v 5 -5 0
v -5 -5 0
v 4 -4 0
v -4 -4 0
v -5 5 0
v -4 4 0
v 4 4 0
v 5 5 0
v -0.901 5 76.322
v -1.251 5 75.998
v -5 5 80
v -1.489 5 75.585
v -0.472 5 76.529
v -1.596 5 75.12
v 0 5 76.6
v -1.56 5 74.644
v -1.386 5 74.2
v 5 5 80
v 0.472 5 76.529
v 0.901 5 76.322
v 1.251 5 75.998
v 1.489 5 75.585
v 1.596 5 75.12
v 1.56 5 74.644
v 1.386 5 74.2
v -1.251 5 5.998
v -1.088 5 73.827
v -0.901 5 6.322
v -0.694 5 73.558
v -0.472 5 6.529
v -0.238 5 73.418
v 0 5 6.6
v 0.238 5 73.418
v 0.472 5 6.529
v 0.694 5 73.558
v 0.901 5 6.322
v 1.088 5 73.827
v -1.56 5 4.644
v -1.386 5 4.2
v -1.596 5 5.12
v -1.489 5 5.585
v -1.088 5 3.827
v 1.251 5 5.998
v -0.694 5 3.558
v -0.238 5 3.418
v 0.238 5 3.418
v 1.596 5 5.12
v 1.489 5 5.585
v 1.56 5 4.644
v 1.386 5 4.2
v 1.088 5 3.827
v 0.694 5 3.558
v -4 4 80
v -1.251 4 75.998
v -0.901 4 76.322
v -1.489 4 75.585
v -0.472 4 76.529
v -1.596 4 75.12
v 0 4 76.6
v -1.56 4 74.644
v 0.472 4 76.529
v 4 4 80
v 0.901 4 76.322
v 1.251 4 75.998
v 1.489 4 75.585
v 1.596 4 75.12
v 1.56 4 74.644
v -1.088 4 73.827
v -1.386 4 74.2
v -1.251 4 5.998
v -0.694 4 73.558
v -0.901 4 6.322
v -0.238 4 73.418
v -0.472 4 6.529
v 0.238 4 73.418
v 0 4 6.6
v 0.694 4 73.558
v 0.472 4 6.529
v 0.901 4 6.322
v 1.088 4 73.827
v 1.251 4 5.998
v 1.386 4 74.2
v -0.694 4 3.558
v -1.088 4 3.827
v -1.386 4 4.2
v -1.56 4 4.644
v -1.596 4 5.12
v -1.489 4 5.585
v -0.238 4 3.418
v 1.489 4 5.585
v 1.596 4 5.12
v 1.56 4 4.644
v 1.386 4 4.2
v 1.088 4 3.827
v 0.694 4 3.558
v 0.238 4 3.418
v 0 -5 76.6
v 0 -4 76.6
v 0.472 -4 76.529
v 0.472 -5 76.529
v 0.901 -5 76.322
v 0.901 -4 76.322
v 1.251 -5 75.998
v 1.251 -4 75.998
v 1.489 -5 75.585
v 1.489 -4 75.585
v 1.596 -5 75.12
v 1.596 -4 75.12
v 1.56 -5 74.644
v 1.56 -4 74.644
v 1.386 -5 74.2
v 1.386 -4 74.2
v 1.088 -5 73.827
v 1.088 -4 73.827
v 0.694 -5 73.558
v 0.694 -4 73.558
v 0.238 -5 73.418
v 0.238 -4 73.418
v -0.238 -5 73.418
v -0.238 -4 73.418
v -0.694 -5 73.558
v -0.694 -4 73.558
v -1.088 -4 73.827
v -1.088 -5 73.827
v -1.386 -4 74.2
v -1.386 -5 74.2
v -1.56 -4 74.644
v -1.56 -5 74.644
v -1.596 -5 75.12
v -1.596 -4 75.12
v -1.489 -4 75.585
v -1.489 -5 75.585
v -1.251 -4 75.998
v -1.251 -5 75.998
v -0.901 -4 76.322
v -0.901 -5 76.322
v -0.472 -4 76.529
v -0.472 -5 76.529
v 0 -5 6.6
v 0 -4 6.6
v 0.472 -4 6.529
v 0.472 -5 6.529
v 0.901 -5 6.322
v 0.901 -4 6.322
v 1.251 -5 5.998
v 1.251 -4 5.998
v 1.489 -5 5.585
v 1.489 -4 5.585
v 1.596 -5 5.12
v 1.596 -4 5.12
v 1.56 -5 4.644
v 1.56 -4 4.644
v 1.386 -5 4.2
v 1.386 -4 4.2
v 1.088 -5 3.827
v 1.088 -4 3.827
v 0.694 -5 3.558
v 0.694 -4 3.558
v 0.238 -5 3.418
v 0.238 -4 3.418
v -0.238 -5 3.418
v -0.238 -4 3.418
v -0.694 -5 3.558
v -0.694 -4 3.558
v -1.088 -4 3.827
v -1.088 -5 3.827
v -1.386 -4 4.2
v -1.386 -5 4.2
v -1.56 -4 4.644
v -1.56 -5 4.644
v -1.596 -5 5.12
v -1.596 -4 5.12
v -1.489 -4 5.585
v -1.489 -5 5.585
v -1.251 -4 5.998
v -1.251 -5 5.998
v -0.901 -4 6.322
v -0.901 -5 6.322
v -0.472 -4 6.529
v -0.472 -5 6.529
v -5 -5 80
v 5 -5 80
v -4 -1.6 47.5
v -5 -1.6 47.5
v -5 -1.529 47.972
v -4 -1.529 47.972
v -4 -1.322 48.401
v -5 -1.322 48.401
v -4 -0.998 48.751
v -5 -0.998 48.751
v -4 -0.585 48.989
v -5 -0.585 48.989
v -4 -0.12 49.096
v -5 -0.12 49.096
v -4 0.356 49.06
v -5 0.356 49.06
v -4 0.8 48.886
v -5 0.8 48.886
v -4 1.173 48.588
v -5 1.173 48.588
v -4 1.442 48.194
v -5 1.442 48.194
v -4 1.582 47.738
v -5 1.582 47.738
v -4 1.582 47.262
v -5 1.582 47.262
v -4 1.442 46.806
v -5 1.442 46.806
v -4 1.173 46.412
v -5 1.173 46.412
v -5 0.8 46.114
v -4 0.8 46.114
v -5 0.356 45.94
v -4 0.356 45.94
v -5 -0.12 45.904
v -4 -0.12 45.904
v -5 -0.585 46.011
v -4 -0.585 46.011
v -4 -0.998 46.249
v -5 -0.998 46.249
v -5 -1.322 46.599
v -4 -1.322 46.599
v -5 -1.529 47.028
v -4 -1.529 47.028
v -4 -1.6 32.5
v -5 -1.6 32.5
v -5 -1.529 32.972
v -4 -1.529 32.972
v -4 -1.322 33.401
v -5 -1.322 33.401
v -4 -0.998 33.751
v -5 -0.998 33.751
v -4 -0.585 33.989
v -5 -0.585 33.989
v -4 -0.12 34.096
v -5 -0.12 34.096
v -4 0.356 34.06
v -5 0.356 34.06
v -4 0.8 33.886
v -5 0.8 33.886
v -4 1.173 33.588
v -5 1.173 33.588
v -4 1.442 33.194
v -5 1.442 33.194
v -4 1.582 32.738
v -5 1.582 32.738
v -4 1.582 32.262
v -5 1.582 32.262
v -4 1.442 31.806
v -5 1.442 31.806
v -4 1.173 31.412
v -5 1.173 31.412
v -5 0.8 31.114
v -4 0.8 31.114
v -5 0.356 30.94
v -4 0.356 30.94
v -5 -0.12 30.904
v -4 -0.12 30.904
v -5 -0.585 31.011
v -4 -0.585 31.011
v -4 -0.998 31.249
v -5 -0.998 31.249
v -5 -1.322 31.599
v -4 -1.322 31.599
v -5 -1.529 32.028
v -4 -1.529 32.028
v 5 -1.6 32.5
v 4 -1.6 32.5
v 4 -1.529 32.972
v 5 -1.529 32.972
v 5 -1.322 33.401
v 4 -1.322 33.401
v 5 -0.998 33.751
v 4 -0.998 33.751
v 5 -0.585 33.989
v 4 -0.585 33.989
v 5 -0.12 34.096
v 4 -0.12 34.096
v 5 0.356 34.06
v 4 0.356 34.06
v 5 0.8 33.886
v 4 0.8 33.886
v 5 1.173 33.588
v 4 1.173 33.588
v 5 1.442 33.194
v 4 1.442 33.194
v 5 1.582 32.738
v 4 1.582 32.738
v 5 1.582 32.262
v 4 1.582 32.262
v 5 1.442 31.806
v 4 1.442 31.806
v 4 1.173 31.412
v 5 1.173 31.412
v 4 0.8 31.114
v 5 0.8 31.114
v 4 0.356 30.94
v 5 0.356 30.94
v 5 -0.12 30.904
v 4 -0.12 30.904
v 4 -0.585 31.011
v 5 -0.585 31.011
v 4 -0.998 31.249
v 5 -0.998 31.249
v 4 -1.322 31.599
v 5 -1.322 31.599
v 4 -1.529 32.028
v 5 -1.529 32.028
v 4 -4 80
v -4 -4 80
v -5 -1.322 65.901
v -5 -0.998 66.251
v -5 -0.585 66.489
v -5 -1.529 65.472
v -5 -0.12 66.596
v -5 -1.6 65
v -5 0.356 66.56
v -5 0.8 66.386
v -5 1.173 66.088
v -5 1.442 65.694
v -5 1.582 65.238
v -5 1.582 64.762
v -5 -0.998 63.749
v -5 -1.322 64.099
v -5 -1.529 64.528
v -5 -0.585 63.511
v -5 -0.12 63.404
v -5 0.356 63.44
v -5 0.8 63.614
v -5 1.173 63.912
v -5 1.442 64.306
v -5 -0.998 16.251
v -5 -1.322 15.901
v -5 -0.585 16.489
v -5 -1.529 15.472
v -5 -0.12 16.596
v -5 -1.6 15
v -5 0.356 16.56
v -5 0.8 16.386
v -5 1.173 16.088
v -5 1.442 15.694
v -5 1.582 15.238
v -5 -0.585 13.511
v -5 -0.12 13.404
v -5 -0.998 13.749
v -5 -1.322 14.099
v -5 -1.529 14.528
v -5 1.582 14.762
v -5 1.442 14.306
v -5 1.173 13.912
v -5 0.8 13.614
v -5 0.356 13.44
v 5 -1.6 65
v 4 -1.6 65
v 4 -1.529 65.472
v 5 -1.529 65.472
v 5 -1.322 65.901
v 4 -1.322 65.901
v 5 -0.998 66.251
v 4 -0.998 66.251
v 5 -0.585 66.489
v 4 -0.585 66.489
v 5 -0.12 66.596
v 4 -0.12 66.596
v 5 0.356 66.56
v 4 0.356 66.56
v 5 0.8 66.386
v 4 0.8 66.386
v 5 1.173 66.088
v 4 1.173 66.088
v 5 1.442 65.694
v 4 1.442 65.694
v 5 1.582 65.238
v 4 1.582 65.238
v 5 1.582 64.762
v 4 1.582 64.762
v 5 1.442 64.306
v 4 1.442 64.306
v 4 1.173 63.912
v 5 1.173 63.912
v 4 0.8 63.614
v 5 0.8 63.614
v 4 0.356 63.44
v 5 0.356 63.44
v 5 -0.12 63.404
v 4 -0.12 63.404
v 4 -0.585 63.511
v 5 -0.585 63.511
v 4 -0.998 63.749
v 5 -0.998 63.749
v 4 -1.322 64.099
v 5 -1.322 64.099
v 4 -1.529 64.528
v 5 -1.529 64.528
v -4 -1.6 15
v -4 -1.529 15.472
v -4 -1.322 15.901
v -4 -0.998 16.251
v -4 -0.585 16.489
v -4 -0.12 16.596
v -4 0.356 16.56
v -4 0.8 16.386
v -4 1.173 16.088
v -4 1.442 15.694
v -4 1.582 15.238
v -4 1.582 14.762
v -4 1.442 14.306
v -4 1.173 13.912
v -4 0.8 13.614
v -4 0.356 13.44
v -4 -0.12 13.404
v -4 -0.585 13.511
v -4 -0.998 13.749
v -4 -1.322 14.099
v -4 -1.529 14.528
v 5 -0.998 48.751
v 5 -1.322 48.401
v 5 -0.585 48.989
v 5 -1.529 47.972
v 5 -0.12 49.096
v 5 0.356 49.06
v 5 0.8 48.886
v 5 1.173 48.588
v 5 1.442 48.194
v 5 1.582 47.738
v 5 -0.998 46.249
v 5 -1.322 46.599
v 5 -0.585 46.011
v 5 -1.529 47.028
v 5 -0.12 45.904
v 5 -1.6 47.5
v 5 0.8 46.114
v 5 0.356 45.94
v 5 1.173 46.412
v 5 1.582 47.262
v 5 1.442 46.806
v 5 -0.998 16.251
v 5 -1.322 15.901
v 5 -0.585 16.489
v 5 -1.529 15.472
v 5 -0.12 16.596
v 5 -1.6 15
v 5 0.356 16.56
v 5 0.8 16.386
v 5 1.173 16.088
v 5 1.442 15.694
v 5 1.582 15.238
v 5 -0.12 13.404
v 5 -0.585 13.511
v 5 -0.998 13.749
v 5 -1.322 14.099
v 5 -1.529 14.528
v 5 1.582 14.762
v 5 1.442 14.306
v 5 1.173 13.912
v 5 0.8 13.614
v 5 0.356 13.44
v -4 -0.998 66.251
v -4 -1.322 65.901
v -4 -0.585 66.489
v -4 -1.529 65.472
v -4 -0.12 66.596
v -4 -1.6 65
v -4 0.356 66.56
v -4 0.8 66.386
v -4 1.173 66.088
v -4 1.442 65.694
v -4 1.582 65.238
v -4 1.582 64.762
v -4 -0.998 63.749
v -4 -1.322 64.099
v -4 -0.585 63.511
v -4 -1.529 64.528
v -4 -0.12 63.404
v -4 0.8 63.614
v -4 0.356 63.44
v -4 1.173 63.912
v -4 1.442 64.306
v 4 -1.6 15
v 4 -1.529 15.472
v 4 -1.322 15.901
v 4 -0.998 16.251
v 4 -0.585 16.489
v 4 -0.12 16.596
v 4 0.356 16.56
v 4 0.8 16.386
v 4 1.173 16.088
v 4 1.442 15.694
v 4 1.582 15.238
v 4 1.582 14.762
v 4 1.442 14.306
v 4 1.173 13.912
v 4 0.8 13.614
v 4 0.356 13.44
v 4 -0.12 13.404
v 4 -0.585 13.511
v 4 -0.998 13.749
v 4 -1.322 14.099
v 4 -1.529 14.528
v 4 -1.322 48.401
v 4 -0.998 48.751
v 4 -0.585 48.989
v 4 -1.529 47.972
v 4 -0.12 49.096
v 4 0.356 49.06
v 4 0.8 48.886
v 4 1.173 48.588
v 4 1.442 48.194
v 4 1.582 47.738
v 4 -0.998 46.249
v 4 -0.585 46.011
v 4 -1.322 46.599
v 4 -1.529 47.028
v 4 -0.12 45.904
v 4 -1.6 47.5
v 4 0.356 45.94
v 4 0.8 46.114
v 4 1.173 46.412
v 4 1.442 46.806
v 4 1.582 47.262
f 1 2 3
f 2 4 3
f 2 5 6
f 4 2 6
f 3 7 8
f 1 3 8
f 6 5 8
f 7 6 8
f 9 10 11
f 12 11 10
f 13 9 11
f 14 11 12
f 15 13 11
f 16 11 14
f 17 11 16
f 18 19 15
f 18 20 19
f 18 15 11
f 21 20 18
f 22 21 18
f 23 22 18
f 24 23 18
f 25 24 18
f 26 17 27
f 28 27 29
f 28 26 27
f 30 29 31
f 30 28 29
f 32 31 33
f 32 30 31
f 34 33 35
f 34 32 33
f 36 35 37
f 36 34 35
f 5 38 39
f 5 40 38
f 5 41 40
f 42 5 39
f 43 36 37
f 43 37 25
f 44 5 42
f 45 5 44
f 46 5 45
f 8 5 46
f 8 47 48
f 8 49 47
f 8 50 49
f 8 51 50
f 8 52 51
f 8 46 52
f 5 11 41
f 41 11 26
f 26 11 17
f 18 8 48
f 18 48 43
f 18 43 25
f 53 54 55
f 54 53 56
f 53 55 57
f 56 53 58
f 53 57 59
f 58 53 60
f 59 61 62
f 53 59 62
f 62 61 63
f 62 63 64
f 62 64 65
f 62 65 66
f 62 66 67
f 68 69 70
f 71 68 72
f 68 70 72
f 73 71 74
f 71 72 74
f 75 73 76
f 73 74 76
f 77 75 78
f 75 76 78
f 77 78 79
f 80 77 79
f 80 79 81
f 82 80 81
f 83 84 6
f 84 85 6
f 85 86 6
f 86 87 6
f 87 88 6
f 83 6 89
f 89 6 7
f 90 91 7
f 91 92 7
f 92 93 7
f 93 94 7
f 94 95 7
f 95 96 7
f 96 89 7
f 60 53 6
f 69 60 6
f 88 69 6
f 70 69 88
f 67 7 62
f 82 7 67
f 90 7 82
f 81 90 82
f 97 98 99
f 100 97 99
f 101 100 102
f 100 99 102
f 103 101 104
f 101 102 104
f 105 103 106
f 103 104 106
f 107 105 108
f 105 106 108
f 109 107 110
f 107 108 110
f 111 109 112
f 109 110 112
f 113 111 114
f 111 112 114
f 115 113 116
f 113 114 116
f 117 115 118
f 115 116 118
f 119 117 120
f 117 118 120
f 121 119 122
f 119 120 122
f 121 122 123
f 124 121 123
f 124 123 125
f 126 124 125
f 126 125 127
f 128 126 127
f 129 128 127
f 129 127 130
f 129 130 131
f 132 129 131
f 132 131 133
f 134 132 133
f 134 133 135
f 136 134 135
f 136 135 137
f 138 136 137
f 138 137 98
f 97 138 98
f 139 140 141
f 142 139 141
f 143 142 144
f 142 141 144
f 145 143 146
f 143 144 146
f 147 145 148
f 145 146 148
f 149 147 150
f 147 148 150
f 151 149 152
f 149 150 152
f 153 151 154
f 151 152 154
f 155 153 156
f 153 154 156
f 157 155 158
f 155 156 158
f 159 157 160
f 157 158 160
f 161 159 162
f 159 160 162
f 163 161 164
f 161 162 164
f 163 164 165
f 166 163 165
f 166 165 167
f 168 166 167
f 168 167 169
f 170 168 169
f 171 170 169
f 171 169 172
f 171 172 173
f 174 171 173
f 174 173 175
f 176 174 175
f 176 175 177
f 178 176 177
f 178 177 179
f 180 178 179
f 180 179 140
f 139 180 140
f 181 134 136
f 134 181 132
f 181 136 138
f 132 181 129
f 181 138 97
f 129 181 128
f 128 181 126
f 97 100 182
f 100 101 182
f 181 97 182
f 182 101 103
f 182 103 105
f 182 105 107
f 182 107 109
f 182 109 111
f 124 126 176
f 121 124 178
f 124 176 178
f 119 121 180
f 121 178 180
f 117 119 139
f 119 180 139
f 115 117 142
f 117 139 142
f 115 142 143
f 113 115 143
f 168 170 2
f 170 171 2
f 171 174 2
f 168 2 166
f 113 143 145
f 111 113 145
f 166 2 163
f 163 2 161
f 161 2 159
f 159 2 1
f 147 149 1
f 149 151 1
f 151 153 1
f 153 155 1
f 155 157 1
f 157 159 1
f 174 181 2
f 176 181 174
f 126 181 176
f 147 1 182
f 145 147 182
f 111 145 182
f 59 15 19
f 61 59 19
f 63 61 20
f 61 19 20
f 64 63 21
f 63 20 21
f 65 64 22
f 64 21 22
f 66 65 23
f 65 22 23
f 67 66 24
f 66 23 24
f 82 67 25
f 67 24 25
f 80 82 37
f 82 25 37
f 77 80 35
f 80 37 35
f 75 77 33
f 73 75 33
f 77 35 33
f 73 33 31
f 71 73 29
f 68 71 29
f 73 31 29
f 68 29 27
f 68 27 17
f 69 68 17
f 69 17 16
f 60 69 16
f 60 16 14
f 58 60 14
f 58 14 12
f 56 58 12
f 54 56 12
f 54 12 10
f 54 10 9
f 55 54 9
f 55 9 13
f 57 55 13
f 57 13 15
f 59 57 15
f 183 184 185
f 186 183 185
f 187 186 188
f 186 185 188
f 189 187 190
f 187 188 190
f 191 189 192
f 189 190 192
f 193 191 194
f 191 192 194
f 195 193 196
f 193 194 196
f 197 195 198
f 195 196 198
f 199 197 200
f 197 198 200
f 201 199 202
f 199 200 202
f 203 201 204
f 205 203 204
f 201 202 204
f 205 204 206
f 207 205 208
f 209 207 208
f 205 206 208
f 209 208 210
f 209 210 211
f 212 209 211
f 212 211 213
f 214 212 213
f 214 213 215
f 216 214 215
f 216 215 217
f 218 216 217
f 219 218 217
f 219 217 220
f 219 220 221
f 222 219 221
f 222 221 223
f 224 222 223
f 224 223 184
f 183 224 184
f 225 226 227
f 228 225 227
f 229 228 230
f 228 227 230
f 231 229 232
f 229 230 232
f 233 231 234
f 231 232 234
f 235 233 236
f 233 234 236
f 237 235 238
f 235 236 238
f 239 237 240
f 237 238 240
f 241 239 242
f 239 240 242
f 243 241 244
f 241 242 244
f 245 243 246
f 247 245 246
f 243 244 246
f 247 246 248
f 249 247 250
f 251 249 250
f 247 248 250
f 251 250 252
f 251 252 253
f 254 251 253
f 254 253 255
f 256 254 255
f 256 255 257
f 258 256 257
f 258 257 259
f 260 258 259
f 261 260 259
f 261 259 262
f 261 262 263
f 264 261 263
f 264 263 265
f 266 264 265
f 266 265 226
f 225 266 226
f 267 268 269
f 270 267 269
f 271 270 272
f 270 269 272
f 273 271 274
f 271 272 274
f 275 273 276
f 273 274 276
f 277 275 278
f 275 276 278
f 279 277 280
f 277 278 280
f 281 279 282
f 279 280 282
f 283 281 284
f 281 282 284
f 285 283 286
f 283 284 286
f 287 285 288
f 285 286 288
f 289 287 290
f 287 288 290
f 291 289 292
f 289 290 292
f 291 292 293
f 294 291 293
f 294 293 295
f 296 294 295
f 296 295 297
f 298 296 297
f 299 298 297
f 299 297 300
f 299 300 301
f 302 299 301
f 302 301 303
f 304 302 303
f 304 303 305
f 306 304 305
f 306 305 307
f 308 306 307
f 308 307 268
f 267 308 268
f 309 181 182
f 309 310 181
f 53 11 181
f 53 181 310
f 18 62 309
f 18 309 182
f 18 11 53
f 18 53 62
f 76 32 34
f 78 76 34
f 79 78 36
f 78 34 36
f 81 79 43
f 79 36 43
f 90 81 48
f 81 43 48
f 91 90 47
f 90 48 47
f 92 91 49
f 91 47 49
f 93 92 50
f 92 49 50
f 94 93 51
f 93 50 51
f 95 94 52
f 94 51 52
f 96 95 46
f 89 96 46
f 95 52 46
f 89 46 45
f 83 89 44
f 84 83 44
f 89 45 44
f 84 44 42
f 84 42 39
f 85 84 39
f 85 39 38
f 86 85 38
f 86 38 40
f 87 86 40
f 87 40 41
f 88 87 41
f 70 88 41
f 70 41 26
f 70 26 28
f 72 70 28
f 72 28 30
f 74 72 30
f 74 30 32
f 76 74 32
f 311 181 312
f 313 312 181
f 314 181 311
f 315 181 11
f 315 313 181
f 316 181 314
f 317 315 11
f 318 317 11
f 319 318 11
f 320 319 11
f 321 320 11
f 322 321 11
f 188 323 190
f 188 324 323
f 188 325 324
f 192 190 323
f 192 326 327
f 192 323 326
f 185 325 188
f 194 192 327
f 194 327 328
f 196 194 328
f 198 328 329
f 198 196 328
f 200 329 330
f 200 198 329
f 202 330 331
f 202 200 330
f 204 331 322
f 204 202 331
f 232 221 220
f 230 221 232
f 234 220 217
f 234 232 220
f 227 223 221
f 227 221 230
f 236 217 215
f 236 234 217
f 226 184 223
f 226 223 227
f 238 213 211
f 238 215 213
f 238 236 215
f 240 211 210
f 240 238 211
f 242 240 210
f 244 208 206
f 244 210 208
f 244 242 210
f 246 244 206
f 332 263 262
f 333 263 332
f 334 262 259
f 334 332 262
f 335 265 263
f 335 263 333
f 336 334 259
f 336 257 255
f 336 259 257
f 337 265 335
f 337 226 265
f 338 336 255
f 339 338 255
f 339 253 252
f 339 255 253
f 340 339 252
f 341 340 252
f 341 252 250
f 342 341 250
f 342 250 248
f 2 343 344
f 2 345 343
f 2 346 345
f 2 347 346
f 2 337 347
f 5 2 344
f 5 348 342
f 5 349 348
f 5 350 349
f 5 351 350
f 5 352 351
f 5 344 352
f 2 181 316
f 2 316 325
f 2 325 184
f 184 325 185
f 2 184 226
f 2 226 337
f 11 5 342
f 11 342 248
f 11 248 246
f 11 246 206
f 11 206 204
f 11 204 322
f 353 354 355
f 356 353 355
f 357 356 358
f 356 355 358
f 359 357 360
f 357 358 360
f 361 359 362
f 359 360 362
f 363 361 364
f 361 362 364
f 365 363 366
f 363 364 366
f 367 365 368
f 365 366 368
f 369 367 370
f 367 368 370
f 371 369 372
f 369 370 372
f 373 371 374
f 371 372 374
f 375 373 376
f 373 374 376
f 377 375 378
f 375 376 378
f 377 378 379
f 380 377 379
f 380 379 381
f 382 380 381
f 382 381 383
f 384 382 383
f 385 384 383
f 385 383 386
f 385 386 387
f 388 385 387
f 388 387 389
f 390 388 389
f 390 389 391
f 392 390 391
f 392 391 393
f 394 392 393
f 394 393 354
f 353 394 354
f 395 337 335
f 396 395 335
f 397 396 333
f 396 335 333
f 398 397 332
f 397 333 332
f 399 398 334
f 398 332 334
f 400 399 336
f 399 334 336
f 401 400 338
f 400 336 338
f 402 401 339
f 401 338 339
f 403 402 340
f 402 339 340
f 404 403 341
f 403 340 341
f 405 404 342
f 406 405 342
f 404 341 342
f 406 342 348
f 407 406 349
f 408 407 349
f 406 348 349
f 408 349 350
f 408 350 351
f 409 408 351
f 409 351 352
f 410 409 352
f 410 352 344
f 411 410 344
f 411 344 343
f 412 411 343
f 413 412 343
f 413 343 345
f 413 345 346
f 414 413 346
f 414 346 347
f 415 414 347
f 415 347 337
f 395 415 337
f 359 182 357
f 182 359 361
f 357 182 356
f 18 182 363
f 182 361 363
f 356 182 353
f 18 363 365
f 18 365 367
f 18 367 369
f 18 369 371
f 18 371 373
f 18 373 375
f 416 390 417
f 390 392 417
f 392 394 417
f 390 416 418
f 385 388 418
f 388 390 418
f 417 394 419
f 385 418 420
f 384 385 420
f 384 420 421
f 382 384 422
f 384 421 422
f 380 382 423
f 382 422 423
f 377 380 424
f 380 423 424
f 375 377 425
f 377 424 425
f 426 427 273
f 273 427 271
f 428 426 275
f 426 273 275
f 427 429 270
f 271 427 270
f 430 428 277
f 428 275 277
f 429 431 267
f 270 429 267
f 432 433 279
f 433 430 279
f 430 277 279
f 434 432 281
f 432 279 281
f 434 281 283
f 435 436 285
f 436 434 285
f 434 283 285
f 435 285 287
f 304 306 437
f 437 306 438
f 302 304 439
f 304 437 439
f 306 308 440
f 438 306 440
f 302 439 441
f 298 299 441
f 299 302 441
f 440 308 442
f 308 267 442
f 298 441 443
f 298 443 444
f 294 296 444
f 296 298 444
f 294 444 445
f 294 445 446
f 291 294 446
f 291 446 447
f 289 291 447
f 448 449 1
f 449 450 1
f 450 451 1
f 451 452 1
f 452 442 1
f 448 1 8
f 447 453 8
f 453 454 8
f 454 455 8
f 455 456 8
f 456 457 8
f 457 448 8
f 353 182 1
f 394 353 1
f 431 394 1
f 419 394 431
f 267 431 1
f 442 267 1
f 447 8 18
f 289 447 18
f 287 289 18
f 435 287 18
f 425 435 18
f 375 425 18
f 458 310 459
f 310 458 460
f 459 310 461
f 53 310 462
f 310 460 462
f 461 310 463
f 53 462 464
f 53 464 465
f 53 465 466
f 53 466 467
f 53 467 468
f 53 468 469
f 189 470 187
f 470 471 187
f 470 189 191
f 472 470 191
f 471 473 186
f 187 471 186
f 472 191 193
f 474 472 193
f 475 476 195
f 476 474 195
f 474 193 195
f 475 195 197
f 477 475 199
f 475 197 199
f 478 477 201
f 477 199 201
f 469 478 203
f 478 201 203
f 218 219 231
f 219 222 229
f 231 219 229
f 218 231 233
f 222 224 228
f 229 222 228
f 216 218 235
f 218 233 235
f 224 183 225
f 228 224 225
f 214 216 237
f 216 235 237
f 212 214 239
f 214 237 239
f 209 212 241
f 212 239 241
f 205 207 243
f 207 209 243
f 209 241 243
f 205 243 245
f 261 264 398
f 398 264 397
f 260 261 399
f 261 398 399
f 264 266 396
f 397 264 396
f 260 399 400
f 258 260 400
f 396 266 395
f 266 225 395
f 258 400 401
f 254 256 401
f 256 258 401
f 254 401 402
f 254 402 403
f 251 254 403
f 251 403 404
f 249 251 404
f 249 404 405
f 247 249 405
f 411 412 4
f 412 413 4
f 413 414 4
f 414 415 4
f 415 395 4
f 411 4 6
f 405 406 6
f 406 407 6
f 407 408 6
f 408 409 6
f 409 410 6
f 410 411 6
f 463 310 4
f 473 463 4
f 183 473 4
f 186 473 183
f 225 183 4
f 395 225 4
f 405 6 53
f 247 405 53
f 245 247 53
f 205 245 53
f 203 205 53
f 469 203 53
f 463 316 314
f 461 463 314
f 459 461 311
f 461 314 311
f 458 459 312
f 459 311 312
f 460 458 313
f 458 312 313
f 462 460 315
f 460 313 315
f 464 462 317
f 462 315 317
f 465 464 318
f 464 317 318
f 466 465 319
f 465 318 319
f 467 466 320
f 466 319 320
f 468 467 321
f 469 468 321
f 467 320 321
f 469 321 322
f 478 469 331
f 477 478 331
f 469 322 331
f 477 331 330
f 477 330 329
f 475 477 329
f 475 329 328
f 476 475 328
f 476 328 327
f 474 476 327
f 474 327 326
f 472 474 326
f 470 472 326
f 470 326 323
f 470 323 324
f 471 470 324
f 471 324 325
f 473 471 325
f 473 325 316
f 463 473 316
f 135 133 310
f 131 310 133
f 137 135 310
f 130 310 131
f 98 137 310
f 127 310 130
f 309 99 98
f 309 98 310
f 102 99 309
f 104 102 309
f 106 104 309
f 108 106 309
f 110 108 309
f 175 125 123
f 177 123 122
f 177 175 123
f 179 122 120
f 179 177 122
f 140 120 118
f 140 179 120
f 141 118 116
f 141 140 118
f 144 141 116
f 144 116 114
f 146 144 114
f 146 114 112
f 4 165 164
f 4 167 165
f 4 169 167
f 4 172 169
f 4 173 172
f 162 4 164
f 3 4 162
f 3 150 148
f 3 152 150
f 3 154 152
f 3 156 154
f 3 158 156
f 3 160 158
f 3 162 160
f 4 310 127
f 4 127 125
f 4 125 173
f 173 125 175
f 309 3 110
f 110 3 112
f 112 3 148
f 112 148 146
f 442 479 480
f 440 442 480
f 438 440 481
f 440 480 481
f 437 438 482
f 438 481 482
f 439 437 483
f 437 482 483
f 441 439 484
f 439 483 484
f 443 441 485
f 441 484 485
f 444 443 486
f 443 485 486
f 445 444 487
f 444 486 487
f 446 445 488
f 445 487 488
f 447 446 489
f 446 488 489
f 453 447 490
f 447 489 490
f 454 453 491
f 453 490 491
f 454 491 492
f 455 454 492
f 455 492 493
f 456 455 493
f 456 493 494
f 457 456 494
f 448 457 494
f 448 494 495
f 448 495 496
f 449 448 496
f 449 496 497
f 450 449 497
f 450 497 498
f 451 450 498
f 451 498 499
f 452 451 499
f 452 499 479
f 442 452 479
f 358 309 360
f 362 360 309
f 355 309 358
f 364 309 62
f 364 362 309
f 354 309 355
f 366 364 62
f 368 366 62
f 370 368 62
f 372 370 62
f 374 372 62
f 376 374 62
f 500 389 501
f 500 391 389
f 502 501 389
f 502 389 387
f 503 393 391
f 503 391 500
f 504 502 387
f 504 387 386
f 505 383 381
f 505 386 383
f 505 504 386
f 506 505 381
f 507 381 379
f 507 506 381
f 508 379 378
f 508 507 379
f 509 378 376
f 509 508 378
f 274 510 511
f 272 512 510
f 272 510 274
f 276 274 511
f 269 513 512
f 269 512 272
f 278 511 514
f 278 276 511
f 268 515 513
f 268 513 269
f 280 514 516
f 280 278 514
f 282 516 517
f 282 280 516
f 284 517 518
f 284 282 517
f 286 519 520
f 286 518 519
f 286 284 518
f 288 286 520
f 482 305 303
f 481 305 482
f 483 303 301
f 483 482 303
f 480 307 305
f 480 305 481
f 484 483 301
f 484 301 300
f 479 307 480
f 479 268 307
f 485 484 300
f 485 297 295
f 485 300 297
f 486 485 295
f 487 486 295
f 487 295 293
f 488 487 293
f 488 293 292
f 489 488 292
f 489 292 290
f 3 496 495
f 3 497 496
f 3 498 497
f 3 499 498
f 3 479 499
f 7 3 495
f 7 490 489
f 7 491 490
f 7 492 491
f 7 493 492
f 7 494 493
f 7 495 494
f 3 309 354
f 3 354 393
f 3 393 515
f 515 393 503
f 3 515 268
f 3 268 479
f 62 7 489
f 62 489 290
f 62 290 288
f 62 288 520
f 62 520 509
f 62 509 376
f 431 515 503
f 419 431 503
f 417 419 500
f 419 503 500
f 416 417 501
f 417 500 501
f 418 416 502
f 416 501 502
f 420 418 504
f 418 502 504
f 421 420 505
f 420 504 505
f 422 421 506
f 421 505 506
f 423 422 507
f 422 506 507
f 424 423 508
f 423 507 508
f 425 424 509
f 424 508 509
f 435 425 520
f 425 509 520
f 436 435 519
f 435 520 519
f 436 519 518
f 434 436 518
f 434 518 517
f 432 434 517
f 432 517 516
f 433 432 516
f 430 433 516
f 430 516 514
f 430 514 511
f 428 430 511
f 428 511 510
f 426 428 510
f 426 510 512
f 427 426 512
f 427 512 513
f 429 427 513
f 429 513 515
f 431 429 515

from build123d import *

# Parameters (mm, degrees)
SKETCH_1_W          = 10
SKETCH_1_H          = 10
SKETCH_1_W_2        = 8
SKETCH_1_H_2        = 8
EXTRUDE_1_DEPTH     = 80
SKETCH_2_R          = 1.6
CUT_EXTRUDE_1_DEPTH = 81.777472107
SKETCH_3_R          = 1.6
CUT_EXTRUDE_2_DEPTH = 81.777472107


with BuildPart() as part:
    # ｽｹｯﾁ1 → ﾎﾞｽ - 押し出し1 (new body)
    with BuildSketch(Plane.XY):
        Rectangle(SKETCH_1_W, SKETCH_1_H)
        Rectangle(SKETCH_1_W_2, SKETCH_1_H_2, mode=Mode.SUBTRACT)
    extrude(amount=EXTRUDE_1_DEPTH)

    # ｽｹｯﾁ2 → ｶｯﾄ - 押し出し1 (cut, through all)
    with BuildSketch(Plane.ZY.offset(5)):
        with Locations(Location((15, 0, 0), (0, 0, 270))):
            Circle(SKETCH_2_R)
        with Locations(Location((65, 0, 0), (0, 0, 270))):
            Circle(SKETCH_2_R)
        with Locations(Location((32.5, 0, 0), (0, 0, 270))):
            Circle(SKETCH_2_R)
        with Locations(Location((47.5, 0, 0), (0, 0, 270))):
            Circle(SKETCH_2_R)
    extrude(amount=-CUT_EXTRUDE_1_DEPTH, mode=Mode.SUBTRACT)

    # ｽｹｯﾁ3 → ｶｯﾄ - 押し出し2 (cut, through all)
    with BuildSketch(Plane(origin=(0, 5, 0), x_dir=(1, 0, 0), z_dir=(0, 1, 0))):
        with Locations(Location((0, -5, 0), (0, 0, 270))):
            Circle(SKETCH_3_R)
        with Locations(Location((0, -75, 0), (0, 0, 270))):
            Circle(SKETCH_3_R)
    extrude(amount=-CUT_EXTRUDE_2_DEPTH, mode=Mode.SUBTRACT)


solid = part.part
